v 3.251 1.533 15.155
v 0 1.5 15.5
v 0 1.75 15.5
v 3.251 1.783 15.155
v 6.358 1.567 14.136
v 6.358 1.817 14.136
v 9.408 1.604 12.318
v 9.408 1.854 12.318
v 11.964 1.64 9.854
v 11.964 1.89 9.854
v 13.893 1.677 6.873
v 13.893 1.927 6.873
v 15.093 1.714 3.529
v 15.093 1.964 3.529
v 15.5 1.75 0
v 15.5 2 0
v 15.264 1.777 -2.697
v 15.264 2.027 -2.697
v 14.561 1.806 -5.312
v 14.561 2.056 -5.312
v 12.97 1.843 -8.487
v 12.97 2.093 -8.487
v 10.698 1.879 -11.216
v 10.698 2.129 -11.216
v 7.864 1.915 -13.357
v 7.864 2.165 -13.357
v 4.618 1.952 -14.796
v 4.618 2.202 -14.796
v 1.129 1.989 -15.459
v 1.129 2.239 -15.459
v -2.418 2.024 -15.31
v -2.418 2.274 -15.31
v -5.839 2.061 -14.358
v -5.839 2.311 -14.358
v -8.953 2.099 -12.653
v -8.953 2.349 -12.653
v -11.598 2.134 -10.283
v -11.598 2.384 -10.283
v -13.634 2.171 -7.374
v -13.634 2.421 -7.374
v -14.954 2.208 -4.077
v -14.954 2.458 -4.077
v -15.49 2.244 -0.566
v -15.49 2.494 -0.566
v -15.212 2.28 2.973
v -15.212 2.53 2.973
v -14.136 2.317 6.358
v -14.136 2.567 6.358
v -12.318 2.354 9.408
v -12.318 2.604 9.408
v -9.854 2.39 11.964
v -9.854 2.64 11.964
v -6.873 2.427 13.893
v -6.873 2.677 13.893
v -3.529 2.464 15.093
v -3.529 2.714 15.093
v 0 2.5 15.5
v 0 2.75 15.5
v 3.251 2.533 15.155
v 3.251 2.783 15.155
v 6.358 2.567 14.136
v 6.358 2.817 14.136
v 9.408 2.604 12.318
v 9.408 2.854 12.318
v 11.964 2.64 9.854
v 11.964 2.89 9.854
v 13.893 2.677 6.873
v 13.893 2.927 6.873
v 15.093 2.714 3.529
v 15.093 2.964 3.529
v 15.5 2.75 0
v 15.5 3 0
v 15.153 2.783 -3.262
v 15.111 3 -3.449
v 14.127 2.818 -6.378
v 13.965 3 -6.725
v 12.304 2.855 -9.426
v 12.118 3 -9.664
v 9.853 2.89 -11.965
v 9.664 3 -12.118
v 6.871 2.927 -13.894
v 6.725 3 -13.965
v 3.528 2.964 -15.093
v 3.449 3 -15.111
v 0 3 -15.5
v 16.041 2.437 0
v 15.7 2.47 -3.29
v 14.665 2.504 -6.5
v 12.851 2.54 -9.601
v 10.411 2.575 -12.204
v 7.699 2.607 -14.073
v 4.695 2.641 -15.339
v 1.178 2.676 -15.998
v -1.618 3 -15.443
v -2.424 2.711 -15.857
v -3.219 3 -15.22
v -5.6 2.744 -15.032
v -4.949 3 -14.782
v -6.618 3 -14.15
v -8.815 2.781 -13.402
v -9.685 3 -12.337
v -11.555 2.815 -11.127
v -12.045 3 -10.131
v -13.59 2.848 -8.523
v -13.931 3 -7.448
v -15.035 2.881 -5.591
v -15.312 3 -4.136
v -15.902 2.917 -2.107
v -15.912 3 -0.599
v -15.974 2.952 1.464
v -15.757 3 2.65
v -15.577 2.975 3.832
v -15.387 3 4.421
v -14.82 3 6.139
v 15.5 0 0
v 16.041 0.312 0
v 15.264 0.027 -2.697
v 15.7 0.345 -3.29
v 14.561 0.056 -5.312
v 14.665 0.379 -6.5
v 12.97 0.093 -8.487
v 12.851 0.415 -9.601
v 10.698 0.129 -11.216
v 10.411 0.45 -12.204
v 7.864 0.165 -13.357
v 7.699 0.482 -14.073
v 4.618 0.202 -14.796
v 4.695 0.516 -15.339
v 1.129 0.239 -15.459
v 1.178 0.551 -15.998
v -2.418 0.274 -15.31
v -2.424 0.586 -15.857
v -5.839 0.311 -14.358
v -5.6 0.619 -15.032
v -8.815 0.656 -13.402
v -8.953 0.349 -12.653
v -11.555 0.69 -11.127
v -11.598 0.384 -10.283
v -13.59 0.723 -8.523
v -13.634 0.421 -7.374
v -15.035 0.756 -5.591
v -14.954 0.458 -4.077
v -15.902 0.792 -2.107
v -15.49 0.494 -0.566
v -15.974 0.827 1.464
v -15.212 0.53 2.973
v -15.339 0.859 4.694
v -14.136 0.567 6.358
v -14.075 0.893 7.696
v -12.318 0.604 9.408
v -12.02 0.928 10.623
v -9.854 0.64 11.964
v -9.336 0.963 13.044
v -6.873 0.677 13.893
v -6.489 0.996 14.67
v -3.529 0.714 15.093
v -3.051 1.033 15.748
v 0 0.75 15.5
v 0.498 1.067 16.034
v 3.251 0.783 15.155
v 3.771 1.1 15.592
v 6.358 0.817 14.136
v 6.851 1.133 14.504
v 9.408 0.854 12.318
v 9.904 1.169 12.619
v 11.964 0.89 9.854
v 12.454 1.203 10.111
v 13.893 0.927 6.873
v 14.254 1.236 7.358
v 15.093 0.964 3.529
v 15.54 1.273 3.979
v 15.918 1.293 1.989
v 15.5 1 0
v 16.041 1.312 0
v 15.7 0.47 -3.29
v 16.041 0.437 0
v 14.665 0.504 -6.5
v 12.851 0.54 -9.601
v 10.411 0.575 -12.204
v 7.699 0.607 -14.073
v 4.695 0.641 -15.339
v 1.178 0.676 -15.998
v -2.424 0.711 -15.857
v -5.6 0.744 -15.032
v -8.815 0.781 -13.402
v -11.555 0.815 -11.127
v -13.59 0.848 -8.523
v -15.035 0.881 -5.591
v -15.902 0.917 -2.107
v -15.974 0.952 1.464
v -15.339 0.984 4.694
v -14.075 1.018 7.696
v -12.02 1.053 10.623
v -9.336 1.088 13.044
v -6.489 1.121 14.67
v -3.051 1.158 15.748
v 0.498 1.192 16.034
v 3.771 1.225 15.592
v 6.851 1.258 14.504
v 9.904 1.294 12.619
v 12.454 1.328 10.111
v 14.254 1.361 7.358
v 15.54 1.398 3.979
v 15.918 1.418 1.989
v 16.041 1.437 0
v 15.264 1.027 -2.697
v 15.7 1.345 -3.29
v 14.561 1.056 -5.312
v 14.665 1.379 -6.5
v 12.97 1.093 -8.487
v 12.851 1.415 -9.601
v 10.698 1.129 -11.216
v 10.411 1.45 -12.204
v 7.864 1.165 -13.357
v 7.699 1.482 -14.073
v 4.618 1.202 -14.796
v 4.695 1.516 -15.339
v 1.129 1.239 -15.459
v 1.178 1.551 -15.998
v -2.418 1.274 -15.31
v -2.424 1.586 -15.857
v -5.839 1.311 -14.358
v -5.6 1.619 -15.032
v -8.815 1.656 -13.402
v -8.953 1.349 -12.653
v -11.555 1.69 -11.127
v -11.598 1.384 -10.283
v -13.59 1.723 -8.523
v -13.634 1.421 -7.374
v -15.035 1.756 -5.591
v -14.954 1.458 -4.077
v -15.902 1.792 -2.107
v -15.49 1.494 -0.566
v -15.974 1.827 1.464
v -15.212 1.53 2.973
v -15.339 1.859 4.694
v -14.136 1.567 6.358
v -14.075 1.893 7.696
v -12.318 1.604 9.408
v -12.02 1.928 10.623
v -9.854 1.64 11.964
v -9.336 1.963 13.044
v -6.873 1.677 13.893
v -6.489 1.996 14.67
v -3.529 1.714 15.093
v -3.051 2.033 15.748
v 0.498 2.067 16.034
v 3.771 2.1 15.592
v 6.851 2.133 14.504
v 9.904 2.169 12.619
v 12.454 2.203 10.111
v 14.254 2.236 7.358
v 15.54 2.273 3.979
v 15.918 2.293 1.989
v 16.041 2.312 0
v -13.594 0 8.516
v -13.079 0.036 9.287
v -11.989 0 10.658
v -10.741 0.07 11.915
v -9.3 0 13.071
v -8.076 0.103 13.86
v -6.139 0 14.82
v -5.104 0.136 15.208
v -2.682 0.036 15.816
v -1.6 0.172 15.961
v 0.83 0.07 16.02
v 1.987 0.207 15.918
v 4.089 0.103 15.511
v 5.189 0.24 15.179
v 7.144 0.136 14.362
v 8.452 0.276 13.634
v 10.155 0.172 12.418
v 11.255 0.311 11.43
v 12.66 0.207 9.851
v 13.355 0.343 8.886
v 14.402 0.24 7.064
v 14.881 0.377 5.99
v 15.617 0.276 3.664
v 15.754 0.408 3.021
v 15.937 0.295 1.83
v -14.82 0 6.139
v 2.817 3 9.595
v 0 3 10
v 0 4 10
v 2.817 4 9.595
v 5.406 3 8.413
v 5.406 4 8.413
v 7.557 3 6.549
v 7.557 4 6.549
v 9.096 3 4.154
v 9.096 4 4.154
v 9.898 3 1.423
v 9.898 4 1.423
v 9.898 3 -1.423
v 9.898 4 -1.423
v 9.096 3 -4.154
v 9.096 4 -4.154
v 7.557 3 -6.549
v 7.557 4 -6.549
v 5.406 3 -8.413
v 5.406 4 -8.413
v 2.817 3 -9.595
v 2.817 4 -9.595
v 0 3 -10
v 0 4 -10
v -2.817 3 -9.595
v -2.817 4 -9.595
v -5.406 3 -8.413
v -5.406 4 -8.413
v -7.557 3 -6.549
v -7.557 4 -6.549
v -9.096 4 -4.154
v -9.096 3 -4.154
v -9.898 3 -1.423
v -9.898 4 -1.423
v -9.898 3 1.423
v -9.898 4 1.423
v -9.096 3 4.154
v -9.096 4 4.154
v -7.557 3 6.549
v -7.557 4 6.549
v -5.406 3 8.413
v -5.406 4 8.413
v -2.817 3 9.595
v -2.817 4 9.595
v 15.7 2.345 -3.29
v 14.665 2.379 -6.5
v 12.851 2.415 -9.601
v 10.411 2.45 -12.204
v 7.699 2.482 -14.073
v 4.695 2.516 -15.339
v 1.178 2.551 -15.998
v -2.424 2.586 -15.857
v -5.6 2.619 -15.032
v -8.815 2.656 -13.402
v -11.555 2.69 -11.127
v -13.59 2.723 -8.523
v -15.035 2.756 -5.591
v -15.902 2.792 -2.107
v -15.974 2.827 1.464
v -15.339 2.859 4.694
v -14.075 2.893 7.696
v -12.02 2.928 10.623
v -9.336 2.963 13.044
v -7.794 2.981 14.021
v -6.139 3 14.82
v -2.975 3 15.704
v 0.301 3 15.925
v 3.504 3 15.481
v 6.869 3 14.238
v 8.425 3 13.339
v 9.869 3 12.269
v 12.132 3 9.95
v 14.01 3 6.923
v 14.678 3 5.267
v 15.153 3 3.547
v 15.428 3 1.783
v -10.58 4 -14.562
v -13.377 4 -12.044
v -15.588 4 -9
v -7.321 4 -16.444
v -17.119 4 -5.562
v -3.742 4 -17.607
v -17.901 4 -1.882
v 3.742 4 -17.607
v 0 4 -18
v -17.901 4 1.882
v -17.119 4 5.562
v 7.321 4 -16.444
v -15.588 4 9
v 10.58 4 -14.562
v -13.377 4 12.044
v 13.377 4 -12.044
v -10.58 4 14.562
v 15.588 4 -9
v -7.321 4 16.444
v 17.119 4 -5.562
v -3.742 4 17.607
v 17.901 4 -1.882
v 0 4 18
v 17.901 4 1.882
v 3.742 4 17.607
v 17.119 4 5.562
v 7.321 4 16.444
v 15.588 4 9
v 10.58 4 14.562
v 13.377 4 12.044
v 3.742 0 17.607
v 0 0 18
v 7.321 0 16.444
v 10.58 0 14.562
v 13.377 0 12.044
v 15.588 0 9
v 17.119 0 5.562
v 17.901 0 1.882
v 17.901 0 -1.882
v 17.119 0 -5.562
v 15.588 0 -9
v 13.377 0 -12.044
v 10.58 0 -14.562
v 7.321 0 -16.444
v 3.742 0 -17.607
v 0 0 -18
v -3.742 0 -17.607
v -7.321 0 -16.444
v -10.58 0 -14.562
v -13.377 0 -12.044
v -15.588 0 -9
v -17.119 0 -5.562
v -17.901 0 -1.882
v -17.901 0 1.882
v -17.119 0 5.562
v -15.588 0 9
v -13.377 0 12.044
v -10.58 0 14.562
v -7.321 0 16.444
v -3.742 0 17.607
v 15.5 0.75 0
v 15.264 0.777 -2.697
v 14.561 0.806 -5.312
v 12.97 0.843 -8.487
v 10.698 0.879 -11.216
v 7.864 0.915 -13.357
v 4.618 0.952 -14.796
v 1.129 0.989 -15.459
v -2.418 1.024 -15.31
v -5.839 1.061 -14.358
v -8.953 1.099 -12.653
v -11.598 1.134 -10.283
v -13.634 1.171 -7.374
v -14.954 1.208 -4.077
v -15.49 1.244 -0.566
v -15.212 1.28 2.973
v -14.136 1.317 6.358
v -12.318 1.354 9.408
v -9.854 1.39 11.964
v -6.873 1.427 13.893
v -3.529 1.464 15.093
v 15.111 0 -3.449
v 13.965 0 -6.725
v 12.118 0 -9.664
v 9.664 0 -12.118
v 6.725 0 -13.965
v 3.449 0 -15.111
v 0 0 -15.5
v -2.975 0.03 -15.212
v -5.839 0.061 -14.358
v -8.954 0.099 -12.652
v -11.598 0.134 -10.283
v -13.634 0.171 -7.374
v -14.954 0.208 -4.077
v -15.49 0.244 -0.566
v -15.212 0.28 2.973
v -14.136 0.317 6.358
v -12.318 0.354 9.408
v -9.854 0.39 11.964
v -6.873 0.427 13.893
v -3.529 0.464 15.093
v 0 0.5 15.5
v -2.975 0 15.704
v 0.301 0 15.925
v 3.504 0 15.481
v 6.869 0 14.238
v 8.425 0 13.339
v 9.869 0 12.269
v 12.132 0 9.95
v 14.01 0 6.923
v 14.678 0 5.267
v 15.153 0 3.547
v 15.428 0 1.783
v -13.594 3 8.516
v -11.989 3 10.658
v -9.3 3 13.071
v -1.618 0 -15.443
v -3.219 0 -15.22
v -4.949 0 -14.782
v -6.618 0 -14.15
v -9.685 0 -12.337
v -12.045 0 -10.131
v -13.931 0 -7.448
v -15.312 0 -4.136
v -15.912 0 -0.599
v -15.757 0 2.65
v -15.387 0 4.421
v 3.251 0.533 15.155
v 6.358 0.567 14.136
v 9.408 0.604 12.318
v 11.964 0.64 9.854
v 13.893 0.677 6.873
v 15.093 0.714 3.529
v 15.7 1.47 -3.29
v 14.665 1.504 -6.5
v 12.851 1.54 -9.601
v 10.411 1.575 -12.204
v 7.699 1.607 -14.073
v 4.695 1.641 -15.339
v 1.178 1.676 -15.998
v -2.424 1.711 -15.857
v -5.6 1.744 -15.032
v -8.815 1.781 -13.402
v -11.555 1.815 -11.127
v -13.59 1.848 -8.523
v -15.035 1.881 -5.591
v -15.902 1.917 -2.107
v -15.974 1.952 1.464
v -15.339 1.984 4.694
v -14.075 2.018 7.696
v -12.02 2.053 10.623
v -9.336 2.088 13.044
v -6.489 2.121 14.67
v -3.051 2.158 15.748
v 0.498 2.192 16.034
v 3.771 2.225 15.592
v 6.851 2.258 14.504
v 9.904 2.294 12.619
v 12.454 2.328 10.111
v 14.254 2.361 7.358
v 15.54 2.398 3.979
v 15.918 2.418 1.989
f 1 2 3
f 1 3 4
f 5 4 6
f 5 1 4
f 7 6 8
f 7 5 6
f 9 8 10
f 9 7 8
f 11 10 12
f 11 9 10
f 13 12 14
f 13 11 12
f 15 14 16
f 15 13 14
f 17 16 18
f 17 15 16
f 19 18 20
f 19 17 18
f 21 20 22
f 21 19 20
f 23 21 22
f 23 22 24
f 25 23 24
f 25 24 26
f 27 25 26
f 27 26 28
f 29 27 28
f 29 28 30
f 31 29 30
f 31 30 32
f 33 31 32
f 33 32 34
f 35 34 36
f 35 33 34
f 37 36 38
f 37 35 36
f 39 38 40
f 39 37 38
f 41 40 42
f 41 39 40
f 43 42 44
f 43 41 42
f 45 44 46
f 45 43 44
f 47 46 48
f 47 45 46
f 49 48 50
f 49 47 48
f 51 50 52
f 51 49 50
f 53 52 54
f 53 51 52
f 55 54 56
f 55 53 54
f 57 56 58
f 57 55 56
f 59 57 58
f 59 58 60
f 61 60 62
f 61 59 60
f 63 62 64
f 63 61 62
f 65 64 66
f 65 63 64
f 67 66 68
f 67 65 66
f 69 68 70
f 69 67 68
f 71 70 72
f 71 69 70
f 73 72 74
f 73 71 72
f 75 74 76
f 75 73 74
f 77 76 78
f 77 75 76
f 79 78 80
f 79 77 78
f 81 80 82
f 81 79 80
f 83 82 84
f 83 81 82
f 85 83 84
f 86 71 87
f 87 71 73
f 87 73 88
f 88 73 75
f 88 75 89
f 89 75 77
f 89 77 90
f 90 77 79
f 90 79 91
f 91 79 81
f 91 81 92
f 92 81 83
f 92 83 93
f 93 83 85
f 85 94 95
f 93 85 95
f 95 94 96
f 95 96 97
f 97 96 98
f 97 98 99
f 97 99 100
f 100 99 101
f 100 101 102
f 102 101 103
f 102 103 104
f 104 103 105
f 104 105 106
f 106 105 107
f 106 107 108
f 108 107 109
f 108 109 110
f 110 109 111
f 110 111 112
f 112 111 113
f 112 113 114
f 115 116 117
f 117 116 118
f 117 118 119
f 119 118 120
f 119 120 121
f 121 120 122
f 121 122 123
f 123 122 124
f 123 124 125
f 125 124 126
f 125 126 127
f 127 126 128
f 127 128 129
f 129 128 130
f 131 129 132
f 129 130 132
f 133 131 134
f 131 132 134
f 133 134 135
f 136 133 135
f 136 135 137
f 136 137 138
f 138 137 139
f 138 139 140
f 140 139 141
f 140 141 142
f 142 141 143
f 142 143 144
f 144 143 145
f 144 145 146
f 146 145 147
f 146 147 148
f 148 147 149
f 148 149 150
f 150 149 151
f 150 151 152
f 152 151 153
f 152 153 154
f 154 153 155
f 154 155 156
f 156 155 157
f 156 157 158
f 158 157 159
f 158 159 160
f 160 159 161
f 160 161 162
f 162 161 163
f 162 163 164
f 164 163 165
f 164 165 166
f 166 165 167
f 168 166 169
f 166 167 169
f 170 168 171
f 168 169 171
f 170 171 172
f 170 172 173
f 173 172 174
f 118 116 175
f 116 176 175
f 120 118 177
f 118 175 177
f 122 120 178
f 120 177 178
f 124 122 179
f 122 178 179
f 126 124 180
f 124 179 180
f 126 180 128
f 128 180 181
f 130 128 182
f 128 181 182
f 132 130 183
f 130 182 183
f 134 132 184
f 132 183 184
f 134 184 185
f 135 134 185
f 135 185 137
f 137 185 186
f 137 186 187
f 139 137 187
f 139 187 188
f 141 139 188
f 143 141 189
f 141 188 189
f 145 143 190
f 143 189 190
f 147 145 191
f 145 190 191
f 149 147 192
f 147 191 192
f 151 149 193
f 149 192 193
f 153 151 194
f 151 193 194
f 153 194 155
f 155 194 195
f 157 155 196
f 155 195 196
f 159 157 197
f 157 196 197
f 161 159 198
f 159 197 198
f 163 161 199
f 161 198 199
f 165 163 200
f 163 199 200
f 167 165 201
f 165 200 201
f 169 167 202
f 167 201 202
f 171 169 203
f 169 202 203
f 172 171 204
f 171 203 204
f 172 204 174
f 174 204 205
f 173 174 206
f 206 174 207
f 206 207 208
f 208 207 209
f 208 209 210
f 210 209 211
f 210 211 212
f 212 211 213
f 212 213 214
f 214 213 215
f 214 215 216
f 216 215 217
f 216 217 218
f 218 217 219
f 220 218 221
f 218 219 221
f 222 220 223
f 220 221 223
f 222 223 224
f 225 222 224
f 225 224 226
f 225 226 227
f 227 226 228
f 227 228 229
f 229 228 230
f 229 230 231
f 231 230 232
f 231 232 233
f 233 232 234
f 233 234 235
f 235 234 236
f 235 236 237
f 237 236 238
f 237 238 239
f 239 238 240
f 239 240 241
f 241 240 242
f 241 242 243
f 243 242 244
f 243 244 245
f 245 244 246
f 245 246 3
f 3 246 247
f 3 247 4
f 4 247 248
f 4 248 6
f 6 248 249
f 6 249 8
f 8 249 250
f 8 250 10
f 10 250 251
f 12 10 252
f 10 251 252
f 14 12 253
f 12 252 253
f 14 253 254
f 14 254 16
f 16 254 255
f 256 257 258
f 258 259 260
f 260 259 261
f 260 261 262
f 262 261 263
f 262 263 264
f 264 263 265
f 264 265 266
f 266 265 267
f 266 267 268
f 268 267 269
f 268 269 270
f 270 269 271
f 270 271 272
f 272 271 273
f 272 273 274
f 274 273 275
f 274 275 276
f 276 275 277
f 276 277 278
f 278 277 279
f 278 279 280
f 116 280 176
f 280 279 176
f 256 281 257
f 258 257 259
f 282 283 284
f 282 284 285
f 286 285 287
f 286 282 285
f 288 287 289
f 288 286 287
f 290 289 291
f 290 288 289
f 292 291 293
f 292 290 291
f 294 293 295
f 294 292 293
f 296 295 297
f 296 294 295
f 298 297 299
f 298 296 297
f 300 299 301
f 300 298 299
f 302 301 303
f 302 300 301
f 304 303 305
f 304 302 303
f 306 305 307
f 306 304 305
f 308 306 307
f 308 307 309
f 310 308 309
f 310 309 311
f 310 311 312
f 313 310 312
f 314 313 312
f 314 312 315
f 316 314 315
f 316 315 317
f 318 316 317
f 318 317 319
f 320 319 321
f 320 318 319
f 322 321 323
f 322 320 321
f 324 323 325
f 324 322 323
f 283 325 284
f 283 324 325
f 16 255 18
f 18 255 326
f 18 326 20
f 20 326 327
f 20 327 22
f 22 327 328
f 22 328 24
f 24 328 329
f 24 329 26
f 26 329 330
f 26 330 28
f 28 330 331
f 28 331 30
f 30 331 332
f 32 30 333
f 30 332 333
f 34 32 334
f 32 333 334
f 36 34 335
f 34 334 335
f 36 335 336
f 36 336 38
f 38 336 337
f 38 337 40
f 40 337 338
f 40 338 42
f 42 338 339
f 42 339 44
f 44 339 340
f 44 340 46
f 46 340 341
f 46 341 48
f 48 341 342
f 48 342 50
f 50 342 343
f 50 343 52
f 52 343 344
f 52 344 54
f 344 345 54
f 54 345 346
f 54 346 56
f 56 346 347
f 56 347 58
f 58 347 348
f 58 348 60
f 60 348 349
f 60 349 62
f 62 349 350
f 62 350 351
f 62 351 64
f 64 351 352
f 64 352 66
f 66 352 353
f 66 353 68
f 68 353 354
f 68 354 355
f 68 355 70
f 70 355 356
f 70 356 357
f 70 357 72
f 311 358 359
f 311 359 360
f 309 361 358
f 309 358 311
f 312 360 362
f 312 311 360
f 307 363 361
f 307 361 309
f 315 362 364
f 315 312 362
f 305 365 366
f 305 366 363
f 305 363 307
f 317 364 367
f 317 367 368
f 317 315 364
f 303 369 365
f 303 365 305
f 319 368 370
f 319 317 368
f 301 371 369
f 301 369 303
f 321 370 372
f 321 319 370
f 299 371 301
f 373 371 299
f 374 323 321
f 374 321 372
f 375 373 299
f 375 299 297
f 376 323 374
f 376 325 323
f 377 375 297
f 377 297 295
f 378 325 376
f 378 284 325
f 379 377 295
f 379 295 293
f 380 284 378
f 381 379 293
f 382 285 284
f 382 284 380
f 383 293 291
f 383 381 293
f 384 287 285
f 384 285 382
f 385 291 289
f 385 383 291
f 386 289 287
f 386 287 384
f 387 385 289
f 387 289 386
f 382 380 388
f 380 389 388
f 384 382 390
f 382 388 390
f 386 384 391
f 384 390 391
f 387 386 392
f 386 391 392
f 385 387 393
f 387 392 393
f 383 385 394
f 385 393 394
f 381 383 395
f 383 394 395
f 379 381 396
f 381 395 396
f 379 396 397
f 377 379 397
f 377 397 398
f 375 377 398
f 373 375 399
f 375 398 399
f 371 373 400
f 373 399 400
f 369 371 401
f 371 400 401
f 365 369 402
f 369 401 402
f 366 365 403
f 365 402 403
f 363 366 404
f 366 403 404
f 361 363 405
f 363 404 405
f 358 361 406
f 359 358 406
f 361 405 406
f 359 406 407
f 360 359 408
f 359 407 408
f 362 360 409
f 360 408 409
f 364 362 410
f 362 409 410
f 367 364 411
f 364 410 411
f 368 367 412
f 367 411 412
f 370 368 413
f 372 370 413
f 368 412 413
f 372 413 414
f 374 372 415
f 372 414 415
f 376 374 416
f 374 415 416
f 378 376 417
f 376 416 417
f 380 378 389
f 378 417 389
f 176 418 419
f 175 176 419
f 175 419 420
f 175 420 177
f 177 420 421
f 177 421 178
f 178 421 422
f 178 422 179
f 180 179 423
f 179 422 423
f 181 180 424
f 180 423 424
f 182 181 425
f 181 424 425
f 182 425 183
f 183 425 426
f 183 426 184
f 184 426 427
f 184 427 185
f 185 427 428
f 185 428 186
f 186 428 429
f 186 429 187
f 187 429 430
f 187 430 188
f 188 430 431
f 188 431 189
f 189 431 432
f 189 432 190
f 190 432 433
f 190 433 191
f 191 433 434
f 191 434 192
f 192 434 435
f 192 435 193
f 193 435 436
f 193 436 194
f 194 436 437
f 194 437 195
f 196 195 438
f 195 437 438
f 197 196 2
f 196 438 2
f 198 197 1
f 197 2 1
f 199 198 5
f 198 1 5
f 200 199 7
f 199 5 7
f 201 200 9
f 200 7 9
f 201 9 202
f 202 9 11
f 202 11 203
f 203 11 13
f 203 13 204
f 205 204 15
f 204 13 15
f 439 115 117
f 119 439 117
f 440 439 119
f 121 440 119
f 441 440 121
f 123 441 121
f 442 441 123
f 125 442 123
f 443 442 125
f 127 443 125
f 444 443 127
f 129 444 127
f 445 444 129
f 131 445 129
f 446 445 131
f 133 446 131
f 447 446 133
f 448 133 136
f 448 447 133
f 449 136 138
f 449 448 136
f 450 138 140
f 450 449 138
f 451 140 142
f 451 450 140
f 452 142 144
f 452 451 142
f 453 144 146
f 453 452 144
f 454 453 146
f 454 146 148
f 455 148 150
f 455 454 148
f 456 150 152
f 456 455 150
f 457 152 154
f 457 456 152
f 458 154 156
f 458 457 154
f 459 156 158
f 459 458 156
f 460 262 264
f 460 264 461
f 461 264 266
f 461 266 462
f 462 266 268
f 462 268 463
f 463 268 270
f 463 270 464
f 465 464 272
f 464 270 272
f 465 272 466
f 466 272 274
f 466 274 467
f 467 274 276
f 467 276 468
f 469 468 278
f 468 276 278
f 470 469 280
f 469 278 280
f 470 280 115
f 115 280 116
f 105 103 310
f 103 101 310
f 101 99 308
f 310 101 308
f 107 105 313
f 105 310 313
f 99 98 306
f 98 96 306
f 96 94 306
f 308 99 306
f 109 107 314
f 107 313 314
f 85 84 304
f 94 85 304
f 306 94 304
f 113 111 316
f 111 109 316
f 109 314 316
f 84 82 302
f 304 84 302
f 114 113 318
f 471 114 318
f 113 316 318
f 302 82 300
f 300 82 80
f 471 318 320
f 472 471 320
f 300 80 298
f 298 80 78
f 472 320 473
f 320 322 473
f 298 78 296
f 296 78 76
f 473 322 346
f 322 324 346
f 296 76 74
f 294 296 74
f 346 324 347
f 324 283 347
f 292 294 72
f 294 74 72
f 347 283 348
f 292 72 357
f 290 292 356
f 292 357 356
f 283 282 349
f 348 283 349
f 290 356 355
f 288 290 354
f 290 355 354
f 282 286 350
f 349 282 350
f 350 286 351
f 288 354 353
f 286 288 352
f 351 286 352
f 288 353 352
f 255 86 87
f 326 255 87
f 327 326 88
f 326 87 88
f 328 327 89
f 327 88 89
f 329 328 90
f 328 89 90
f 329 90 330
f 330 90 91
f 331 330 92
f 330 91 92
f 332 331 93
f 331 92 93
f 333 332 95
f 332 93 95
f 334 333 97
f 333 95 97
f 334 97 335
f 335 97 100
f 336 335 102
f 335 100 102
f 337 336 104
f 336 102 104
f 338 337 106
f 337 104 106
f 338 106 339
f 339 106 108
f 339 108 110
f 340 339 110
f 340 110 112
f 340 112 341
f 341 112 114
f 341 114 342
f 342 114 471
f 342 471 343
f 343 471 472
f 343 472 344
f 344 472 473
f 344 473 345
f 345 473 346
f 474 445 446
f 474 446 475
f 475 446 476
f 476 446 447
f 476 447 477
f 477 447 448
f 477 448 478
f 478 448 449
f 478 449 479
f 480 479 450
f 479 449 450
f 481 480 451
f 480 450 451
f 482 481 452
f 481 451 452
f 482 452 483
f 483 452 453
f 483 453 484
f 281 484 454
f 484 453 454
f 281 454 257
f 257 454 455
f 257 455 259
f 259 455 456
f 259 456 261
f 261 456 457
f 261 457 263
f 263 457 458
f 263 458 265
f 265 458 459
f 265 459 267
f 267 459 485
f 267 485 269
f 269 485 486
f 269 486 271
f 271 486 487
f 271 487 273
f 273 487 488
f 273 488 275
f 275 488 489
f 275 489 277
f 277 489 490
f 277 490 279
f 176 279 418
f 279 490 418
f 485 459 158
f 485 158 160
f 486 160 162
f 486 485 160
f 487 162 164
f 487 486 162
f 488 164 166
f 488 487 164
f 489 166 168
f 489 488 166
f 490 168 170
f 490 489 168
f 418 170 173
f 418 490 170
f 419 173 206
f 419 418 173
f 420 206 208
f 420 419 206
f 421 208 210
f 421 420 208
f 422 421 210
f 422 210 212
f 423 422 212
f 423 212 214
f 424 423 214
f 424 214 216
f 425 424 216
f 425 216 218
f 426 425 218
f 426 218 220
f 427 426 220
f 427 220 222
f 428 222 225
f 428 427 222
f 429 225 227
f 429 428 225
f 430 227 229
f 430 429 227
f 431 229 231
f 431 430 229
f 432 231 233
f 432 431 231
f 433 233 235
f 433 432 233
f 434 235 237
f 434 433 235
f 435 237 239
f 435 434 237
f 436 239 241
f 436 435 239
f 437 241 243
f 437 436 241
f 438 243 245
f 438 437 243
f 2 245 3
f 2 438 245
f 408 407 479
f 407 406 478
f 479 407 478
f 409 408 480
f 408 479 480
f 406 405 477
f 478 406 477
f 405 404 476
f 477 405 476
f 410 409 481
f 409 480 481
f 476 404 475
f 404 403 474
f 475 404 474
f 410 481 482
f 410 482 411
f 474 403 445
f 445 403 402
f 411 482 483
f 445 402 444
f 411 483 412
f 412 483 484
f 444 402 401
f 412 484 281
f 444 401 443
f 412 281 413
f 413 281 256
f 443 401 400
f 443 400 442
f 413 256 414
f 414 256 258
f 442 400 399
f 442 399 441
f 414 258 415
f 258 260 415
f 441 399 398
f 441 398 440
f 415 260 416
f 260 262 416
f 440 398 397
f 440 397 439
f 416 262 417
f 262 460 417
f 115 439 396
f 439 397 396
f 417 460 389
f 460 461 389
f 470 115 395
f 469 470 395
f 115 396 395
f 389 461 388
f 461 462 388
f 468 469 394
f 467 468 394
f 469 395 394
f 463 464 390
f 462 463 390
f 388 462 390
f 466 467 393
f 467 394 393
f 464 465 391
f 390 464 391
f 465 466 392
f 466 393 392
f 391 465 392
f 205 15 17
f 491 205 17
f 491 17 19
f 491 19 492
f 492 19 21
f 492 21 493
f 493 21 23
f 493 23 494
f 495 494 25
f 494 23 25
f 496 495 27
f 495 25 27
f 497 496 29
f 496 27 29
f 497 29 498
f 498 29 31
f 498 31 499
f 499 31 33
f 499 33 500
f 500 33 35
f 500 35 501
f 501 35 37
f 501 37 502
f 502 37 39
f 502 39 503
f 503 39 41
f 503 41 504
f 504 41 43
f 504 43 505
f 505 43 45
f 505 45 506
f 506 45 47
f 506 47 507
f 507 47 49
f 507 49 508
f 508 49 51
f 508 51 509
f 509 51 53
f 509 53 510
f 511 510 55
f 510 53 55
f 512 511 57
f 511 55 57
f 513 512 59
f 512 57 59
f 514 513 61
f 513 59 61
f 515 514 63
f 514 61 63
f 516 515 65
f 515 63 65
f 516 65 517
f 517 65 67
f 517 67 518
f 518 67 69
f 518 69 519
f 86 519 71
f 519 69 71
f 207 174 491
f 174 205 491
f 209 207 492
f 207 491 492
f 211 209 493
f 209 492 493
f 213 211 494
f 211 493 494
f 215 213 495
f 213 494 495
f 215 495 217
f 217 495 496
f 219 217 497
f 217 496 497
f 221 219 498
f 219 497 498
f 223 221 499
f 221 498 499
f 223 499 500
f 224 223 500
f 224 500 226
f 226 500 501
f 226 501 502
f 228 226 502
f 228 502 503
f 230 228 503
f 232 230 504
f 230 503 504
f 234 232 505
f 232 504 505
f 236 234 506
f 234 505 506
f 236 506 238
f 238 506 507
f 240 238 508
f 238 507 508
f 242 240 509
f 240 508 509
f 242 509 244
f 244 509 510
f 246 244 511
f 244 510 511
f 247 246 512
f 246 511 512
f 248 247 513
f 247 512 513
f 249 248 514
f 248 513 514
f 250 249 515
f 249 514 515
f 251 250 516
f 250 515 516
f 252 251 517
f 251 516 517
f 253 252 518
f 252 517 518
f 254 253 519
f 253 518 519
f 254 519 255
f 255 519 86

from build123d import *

# Parameters (mm, degrees)
SKETCH1_R           = 18
SKETCH1_R_2         = 15.5
BOSS_EXTRUDE1_DEPTH = 3
SKETCH2_R           = 18
SKETCH2_R_2         = 10
BOSS_EXTRUDE2_DEPTH = 1
THREAD2_PITCH       = 1
THREAD2_TO          = 4


with BuildPart() as part:
    # Sketch1 → Boss-Extrude1 (new body)
    with BuildSketch(Plane(origin=(0, 0, 0), x_dir=(1, 0, 0), z_dir=(0, 1, 0))):
        with Locations(Location((0, 0, 0), (0, 0, 270))):
            Circle(SKETCH1_R)
        with Locations(Location((0, 0, 0), (0, 0, 270))):
            Circle(SKETCH1_R_2, mode=Mode.SUBTRACT)
    extrude(amount=BOSS_EXTRUDE1_DEPTH)

    # Sketch2 → Boss-Extrude2 (add)
    with BuildSketch(Plane(origin=(0, 3, 0), x_dir=(1, 0, 0), z_dir=(0, 1, 0))):
        with Locations(Location((0, 0, 0), (0, 0, 270))):
            Circle(SKETCH2_R)
        with Locations(Location((0, 0, 0), (0, 0, 270))):
            Circle(SKETCH2_R_2, mode=Mode.SUBTRACT)
    extrude(amount=BOSS_EXTRUDE2_DEPTH)

    # Thread2: arcs per turn and ends read off the stored shape
    # Thread2: the profile of Thread Profile2 profile screwed along a right-hand helix through 4 turns, 8 arcs to a turn; built about Z, then put on its axis
    thread2_z = Axis((0, 0, 0), (0, 0, 1))
    thread2_corners = [(15.4997, 0, -0.000173205), (16.041265875, 0, 0.312499999), (16.041265875, 0, 0.437499999), (15.4997, 0, 0.750173202)]
    with BuildLine(mode=Mode.PRIVATE) as thread2_profile:
        Line(thread2_corners[0], thread2_corners[1])
        Line(thread2_corners[1], thread2_corners[2])
        Line(thread2_corners[2], thread2_corners[3])
        Line(thread2_corners[3], thread2_corners[0])
    thread2_cap = Face(thread2_profile.wire())
    thread2_turn_angles = [0, 22.5, 45, 67.5, 90, 112.5, 135, 157.5, 180, 202.5, 225, 247.5, 270, 292.5, 315, 337.5, 360]
    thread2_turn_weights = [1, 0.9238795325112867, 1, 0.9238795325112867, 1, 0.9238795325112867, 1, 0.9238795325112867, 1, 0.9238795325112867, 1, 0.9238795325112867, 1, 0.9238795325112867, 1, 0.9238795325112867, 1]
    thread2_turn_rails = [Edge.make_bspline([Vector(p[0], p[1], 0).rotate(thread2_z, thread2_turn_angles[k]) / thread2_turn_weights[k] + Vector(0, 0, p[2] + THREAD2_PITCH * thread2_turn_angles[k] / 360) for k in range(17)], [0, 0, 0, 1, 1, 2, 2, 3, 3, 4, 4, 5, 5, 6, 6, 7, 7, 8, 8, 8], 2, thread2_turn_weights) for p in thread2_corners]
    thread2_turn_sides = [Face.make_surface_from_curves(thread2_turn_rails[p[0]], thread2_turn_rails[p[1]]) for p in [(0, 1), (1, 2), (2, 3), (3, 0)]]
    thread2 = Plane(origin=(0, -1, 0), x_dir=(1, 0, 0), z_dir=(0, 1, 0)) * split(Solid(Shell([*[p.moved(Location((0, 0, THREAD2_PITCH * i))) for i in range(4) for p in thread2_turn_sides], thread2_cap, thread2_cap.rotate(thread2_z, 1440).moved(Location((0, 0, THREAD2_PITCH * 1440 / 360)))])), bisect_by=Plane.XY.offset(THREAD2_TO), keep=Keep.BOTTOM, mode=Mode.PRIVATE)
    add(thread2, mode=Mode.SUBTRACT)


solid = part.part
